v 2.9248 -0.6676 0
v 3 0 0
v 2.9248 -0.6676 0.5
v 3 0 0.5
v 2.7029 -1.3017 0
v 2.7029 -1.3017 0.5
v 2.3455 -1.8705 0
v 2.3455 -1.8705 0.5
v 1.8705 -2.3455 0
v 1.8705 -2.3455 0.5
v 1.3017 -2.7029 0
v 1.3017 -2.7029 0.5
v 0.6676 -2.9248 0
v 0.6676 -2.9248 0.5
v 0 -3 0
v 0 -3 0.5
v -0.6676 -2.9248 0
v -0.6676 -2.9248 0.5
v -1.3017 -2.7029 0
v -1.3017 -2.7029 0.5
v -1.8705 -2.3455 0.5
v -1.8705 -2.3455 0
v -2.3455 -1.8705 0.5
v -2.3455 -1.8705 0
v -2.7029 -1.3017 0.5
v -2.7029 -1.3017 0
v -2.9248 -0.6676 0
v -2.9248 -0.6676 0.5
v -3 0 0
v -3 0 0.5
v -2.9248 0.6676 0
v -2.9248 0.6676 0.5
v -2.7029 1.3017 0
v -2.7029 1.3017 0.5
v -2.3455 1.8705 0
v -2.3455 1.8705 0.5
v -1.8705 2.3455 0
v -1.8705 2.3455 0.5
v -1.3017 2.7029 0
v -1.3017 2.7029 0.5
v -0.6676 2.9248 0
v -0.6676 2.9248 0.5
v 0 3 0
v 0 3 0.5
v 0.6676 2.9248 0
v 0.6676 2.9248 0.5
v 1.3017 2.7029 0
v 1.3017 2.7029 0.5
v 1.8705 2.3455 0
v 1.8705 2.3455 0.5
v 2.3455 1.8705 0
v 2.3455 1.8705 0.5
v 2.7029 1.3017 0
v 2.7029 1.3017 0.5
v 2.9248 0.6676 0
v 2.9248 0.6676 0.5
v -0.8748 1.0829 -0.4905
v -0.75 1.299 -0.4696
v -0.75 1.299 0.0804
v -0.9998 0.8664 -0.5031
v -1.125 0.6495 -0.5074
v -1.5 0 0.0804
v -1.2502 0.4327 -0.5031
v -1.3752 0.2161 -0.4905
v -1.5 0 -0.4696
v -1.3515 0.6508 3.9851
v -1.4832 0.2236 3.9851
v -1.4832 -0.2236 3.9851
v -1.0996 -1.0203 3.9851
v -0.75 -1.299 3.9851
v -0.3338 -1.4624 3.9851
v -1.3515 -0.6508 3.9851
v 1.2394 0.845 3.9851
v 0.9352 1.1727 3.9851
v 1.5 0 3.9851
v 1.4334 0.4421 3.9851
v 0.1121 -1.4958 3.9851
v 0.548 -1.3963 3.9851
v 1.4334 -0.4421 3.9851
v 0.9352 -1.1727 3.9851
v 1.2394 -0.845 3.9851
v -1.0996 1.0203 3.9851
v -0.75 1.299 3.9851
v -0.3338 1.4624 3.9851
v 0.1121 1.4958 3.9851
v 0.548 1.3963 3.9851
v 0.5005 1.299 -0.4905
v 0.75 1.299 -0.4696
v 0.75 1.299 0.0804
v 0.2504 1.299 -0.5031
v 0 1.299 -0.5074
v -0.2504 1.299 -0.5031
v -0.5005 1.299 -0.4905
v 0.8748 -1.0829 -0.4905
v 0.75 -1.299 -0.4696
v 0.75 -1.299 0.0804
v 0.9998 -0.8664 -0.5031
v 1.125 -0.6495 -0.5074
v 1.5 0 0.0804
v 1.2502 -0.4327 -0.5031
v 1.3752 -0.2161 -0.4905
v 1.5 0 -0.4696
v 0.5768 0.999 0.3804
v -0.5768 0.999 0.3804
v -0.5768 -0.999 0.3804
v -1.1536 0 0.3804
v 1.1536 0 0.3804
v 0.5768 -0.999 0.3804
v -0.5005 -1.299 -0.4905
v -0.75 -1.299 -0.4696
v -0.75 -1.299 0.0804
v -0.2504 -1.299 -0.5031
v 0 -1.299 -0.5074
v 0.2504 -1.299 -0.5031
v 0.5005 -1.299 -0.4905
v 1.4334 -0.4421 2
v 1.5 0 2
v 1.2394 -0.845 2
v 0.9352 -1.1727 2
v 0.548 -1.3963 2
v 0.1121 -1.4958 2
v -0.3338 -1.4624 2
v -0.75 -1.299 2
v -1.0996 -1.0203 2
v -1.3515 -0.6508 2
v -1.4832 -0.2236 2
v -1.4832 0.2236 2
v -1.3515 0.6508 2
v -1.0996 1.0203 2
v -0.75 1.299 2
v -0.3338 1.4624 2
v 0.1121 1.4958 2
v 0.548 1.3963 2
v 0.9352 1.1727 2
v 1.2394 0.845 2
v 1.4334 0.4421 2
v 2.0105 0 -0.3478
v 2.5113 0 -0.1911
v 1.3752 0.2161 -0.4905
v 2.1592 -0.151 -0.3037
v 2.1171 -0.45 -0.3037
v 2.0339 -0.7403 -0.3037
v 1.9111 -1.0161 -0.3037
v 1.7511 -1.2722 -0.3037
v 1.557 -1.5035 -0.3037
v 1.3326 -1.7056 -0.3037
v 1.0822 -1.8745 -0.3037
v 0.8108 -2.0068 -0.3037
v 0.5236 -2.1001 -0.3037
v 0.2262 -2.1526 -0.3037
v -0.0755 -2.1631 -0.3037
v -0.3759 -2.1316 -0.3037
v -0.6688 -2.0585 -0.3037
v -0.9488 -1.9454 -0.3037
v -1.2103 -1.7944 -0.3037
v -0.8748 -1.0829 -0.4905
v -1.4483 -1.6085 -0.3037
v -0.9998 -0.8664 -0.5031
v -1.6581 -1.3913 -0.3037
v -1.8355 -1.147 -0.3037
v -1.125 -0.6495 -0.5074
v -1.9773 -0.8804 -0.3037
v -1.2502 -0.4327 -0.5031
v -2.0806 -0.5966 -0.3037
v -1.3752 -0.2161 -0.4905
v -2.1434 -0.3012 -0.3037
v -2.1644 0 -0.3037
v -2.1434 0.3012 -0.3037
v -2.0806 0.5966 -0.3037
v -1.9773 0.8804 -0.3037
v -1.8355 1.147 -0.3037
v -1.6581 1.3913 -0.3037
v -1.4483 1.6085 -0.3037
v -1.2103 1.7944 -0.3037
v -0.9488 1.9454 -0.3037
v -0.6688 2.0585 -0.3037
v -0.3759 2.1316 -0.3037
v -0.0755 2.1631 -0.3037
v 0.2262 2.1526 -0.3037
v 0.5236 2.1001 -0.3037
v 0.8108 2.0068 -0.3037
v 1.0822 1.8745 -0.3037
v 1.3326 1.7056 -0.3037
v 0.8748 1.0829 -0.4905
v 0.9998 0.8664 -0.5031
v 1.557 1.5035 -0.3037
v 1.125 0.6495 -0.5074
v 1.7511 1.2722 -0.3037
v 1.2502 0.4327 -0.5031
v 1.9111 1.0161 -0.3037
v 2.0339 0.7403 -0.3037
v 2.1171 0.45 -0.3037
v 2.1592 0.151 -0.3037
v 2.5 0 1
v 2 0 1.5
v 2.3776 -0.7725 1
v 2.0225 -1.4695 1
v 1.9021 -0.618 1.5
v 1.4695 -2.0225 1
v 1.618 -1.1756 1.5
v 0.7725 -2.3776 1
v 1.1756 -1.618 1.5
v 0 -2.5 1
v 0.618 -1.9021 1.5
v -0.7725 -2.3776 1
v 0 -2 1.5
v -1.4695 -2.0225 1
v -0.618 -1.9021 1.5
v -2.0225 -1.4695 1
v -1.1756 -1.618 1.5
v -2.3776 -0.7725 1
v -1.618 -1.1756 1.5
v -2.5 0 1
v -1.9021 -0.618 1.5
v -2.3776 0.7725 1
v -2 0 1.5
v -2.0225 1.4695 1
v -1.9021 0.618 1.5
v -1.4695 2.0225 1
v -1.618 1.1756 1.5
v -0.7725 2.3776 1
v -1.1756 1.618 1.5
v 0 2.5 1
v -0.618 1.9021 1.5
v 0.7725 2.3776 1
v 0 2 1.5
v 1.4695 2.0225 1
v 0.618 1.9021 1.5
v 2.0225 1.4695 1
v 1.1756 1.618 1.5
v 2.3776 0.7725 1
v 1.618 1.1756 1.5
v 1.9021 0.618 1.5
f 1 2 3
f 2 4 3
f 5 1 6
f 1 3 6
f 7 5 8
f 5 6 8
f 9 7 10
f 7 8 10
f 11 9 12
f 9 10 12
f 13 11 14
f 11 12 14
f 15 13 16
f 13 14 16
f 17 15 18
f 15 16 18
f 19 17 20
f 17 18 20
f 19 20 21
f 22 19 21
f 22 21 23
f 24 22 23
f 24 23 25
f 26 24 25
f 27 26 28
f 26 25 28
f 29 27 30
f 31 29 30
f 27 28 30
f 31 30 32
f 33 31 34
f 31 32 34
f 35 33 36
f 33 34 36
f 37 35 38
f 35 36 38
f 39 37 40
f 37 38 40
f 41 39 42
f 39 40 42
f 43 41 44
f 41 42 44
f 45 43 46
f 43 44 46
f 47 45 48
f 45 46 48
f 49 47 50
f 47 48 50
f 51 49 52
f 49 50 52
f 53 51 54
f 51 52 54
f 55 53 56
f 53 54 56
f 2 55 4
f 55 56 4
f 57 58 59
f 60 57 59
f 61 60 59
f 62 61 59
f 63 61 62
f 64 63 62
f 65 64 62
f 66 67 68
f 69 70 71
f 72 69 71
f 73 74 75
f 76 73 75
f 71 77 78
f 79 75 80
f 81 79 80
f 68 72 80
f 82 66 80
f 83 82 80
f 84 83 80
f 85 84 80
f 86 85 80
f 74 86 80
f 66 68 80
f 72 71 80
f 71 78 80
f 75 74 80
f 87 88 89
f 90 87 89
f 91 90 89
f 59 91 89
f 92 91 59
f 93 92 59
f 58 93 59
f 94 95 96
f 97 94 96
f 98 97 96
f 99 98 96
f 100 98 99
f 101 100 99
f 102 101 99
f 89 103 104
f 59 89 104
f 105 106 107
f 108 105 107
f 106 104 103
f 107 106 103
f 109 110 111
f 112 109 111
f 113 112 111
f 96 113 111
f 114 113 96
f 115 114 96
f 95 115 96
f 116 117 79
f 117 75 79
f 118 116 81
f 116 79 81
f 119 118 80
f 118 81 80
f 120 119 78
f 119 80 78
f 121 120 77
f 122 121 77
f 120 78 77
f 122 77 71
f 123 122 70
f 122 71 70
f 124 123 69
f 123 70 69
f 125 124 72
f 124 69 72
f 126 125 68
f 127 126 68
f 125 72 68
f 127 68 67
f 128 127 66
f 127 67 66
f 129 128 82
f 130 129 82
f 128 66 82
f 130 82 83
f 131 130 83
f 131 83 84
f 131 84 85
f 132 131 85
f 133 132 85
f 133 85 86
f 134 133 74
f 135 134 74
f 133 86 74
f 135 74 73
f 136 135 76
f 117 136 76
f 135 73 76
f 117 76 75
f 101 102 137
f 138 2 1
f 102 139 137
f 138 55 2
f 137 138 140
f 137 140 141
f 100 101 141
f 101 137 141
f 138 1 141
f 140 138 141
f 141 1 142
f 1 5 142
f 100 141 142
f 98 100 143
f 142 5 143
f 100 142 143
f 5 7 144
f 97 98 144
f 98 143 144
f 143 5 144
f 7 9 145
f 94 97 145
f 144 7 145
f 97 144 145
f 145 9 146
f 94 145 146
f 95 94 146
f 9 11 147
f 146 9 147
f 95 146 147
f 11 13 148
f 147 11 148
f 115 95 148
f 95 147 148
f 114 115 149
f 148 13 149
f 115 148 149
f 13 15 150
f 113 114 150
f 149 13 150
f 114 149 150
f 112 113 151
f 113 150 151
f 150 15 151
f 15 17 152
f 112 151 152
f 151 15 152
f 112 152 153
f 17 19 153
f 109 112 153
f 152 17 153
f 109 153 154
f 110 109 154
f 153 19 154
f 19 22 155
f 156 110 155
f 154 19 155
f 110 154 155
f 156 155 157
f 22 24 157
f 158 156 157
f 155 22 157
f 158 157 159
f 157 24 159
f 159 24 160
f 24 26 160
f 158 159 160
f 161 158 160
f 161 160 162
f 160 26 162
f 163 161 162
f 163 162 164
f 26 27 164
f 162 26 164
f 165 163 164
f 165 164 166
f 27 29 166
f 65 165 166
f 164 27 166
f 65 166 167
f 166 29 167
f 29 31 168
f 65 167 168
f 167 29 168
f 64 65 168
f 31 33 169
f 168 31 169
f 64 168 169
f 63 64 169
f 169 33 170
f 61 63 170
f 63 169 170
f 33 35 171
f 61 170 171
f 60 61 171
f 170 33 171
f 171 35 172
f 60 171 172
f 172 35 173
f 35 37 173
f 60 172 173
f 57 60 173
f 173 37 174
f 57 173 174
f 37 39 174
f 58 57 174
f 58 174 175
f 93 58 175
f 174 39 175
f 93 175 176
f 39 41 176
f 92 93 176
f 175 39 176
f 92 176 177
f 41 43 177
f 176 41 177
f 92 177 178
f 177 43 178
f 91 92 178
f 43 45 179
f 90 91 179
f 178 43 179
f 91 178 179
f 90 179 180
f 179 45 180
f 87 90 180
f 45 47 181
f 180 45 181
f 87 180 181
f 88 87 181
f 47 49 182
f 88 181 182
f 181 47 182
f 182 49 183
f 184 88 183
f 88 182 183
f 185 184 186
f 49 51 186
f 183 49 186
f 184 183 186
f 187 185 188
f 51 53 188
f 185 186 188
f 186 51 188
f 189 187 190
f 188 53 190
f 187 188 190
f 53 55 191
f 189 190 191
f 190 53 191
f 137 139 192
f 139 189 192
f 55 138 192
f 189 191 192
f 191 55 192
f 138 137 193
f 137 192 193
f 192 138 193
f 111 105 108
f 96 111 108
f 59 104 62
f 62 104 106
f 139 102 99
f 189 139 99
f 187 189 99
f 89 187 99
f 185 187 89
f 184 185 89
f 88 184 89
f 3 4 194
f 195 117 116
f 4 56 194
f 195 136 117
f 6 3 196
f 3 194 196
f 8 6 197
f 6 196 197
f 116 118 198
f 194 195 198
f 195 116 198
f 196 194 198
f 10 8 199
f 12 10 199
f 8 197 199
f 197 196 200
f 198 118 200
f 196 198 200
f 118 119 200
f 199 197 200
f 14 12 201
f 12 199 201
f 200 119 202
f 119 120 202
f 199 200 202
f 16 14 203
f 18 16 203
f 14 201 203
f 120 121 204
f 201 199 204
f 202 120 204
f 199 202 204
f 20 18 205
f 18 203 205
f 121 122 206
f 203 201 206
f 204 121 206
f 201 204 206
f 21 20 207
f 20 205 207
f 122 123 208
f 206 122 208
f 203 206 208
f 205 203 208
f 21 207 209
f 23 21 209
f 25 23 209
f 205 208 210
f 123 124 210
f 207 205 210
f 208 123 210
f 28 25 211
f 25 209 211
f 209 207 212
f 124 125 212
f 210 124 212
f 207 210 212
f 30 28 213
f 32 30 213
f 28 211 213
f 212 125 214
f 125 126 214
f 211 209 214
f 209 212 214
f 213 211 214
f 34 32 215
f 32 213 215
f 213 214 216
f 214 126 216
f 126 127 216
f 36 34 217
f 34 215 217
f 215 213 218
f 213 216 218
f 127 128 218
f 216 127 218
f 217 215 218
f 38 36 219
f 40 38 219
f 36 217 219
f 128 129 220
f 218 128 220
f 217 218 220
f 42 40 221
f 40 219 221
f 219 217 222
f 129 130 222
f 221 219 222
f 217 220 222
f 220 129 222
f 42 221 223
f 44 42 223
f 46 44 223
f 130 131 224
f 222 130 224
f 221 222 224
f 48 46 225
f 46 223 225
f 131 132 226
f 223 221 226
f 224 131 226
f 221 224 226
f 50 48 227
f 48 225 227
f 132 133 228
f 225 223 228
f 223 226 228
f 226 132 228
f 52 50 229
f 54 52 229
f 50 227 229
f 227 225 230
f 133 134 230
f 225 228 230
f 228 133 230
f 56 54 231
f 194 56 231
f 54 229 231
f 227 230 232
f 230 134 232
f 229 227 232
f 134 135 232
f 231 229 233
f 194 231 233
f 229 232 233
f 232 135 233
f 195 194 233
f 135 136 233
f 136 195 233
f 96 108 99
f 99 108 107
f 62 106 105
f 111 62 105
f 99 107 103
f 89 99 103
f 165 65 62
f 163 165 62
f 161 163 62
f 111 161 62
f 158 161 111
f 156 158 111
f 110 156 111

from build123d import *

# Parameters (mm, degrees)
CUT_EXTRUDE1_DEPTH = 1
CHAMFER1_SIZE      = 0.3


with BuildPart() as part:
    # Sketch1 → Revolve1 (revolve)
    with BuildSketch(Plane(origin=(0, 0, 0), x_dir=(1, 0, 0), z_dir=(0, 1, 0))):
        with BuildLine():
            Line((3, 0), (3, -0.5))
            Line((3, -0.5), (1.5, -2))
            Line((1.5, -2), (1.5, -3.985079935))
            Line((1.5, -3.985079935), (0, -3.985079935))
            Line((0, -3.985079935), (0, 0.619607068))
            ThreePointArc((0, 0.619607068), (1.531658653, 0.463087711), (3, 0))
        make_face()
    revolve(axis=Axis((0, 0, 3.985079935), (0, 0, -1)))

    # Sketch2 → Cut-Extrude1 (cut)
    with BuildSketch(Plane.XY.offset(-0.619607068)):
        Polygon((1.5, 0), (0.75, 1.299038106), (-0.75, 1.299038106), (-1.5, 0), (-0.75, -1.299038106), (0.75, -1.299038106), align=None)
    extrude(amount=CUT_EXTRUDE1_DEPTH, mode=Mode.SUBTRACT)

    # Chamfer1
    chamfer1_edges = [part.edges().sort_by_distance(p)[0] for p in [
        (1.125, -0.649519053, 0.380392932),
        (1.125, 0.649519053, 0.380392932),
        (0, 1.299038106, 0.380392932),
        (-1.125, 0.649519053, 0.380392932),
        (-1.125, -0.649519053, 0.380392932),
        (0, -1.299038106, 0.380392932),
    ]]
    chamfer(chamfer1_edges, length=CHAMFER1_SIZE)


solid = part.part
